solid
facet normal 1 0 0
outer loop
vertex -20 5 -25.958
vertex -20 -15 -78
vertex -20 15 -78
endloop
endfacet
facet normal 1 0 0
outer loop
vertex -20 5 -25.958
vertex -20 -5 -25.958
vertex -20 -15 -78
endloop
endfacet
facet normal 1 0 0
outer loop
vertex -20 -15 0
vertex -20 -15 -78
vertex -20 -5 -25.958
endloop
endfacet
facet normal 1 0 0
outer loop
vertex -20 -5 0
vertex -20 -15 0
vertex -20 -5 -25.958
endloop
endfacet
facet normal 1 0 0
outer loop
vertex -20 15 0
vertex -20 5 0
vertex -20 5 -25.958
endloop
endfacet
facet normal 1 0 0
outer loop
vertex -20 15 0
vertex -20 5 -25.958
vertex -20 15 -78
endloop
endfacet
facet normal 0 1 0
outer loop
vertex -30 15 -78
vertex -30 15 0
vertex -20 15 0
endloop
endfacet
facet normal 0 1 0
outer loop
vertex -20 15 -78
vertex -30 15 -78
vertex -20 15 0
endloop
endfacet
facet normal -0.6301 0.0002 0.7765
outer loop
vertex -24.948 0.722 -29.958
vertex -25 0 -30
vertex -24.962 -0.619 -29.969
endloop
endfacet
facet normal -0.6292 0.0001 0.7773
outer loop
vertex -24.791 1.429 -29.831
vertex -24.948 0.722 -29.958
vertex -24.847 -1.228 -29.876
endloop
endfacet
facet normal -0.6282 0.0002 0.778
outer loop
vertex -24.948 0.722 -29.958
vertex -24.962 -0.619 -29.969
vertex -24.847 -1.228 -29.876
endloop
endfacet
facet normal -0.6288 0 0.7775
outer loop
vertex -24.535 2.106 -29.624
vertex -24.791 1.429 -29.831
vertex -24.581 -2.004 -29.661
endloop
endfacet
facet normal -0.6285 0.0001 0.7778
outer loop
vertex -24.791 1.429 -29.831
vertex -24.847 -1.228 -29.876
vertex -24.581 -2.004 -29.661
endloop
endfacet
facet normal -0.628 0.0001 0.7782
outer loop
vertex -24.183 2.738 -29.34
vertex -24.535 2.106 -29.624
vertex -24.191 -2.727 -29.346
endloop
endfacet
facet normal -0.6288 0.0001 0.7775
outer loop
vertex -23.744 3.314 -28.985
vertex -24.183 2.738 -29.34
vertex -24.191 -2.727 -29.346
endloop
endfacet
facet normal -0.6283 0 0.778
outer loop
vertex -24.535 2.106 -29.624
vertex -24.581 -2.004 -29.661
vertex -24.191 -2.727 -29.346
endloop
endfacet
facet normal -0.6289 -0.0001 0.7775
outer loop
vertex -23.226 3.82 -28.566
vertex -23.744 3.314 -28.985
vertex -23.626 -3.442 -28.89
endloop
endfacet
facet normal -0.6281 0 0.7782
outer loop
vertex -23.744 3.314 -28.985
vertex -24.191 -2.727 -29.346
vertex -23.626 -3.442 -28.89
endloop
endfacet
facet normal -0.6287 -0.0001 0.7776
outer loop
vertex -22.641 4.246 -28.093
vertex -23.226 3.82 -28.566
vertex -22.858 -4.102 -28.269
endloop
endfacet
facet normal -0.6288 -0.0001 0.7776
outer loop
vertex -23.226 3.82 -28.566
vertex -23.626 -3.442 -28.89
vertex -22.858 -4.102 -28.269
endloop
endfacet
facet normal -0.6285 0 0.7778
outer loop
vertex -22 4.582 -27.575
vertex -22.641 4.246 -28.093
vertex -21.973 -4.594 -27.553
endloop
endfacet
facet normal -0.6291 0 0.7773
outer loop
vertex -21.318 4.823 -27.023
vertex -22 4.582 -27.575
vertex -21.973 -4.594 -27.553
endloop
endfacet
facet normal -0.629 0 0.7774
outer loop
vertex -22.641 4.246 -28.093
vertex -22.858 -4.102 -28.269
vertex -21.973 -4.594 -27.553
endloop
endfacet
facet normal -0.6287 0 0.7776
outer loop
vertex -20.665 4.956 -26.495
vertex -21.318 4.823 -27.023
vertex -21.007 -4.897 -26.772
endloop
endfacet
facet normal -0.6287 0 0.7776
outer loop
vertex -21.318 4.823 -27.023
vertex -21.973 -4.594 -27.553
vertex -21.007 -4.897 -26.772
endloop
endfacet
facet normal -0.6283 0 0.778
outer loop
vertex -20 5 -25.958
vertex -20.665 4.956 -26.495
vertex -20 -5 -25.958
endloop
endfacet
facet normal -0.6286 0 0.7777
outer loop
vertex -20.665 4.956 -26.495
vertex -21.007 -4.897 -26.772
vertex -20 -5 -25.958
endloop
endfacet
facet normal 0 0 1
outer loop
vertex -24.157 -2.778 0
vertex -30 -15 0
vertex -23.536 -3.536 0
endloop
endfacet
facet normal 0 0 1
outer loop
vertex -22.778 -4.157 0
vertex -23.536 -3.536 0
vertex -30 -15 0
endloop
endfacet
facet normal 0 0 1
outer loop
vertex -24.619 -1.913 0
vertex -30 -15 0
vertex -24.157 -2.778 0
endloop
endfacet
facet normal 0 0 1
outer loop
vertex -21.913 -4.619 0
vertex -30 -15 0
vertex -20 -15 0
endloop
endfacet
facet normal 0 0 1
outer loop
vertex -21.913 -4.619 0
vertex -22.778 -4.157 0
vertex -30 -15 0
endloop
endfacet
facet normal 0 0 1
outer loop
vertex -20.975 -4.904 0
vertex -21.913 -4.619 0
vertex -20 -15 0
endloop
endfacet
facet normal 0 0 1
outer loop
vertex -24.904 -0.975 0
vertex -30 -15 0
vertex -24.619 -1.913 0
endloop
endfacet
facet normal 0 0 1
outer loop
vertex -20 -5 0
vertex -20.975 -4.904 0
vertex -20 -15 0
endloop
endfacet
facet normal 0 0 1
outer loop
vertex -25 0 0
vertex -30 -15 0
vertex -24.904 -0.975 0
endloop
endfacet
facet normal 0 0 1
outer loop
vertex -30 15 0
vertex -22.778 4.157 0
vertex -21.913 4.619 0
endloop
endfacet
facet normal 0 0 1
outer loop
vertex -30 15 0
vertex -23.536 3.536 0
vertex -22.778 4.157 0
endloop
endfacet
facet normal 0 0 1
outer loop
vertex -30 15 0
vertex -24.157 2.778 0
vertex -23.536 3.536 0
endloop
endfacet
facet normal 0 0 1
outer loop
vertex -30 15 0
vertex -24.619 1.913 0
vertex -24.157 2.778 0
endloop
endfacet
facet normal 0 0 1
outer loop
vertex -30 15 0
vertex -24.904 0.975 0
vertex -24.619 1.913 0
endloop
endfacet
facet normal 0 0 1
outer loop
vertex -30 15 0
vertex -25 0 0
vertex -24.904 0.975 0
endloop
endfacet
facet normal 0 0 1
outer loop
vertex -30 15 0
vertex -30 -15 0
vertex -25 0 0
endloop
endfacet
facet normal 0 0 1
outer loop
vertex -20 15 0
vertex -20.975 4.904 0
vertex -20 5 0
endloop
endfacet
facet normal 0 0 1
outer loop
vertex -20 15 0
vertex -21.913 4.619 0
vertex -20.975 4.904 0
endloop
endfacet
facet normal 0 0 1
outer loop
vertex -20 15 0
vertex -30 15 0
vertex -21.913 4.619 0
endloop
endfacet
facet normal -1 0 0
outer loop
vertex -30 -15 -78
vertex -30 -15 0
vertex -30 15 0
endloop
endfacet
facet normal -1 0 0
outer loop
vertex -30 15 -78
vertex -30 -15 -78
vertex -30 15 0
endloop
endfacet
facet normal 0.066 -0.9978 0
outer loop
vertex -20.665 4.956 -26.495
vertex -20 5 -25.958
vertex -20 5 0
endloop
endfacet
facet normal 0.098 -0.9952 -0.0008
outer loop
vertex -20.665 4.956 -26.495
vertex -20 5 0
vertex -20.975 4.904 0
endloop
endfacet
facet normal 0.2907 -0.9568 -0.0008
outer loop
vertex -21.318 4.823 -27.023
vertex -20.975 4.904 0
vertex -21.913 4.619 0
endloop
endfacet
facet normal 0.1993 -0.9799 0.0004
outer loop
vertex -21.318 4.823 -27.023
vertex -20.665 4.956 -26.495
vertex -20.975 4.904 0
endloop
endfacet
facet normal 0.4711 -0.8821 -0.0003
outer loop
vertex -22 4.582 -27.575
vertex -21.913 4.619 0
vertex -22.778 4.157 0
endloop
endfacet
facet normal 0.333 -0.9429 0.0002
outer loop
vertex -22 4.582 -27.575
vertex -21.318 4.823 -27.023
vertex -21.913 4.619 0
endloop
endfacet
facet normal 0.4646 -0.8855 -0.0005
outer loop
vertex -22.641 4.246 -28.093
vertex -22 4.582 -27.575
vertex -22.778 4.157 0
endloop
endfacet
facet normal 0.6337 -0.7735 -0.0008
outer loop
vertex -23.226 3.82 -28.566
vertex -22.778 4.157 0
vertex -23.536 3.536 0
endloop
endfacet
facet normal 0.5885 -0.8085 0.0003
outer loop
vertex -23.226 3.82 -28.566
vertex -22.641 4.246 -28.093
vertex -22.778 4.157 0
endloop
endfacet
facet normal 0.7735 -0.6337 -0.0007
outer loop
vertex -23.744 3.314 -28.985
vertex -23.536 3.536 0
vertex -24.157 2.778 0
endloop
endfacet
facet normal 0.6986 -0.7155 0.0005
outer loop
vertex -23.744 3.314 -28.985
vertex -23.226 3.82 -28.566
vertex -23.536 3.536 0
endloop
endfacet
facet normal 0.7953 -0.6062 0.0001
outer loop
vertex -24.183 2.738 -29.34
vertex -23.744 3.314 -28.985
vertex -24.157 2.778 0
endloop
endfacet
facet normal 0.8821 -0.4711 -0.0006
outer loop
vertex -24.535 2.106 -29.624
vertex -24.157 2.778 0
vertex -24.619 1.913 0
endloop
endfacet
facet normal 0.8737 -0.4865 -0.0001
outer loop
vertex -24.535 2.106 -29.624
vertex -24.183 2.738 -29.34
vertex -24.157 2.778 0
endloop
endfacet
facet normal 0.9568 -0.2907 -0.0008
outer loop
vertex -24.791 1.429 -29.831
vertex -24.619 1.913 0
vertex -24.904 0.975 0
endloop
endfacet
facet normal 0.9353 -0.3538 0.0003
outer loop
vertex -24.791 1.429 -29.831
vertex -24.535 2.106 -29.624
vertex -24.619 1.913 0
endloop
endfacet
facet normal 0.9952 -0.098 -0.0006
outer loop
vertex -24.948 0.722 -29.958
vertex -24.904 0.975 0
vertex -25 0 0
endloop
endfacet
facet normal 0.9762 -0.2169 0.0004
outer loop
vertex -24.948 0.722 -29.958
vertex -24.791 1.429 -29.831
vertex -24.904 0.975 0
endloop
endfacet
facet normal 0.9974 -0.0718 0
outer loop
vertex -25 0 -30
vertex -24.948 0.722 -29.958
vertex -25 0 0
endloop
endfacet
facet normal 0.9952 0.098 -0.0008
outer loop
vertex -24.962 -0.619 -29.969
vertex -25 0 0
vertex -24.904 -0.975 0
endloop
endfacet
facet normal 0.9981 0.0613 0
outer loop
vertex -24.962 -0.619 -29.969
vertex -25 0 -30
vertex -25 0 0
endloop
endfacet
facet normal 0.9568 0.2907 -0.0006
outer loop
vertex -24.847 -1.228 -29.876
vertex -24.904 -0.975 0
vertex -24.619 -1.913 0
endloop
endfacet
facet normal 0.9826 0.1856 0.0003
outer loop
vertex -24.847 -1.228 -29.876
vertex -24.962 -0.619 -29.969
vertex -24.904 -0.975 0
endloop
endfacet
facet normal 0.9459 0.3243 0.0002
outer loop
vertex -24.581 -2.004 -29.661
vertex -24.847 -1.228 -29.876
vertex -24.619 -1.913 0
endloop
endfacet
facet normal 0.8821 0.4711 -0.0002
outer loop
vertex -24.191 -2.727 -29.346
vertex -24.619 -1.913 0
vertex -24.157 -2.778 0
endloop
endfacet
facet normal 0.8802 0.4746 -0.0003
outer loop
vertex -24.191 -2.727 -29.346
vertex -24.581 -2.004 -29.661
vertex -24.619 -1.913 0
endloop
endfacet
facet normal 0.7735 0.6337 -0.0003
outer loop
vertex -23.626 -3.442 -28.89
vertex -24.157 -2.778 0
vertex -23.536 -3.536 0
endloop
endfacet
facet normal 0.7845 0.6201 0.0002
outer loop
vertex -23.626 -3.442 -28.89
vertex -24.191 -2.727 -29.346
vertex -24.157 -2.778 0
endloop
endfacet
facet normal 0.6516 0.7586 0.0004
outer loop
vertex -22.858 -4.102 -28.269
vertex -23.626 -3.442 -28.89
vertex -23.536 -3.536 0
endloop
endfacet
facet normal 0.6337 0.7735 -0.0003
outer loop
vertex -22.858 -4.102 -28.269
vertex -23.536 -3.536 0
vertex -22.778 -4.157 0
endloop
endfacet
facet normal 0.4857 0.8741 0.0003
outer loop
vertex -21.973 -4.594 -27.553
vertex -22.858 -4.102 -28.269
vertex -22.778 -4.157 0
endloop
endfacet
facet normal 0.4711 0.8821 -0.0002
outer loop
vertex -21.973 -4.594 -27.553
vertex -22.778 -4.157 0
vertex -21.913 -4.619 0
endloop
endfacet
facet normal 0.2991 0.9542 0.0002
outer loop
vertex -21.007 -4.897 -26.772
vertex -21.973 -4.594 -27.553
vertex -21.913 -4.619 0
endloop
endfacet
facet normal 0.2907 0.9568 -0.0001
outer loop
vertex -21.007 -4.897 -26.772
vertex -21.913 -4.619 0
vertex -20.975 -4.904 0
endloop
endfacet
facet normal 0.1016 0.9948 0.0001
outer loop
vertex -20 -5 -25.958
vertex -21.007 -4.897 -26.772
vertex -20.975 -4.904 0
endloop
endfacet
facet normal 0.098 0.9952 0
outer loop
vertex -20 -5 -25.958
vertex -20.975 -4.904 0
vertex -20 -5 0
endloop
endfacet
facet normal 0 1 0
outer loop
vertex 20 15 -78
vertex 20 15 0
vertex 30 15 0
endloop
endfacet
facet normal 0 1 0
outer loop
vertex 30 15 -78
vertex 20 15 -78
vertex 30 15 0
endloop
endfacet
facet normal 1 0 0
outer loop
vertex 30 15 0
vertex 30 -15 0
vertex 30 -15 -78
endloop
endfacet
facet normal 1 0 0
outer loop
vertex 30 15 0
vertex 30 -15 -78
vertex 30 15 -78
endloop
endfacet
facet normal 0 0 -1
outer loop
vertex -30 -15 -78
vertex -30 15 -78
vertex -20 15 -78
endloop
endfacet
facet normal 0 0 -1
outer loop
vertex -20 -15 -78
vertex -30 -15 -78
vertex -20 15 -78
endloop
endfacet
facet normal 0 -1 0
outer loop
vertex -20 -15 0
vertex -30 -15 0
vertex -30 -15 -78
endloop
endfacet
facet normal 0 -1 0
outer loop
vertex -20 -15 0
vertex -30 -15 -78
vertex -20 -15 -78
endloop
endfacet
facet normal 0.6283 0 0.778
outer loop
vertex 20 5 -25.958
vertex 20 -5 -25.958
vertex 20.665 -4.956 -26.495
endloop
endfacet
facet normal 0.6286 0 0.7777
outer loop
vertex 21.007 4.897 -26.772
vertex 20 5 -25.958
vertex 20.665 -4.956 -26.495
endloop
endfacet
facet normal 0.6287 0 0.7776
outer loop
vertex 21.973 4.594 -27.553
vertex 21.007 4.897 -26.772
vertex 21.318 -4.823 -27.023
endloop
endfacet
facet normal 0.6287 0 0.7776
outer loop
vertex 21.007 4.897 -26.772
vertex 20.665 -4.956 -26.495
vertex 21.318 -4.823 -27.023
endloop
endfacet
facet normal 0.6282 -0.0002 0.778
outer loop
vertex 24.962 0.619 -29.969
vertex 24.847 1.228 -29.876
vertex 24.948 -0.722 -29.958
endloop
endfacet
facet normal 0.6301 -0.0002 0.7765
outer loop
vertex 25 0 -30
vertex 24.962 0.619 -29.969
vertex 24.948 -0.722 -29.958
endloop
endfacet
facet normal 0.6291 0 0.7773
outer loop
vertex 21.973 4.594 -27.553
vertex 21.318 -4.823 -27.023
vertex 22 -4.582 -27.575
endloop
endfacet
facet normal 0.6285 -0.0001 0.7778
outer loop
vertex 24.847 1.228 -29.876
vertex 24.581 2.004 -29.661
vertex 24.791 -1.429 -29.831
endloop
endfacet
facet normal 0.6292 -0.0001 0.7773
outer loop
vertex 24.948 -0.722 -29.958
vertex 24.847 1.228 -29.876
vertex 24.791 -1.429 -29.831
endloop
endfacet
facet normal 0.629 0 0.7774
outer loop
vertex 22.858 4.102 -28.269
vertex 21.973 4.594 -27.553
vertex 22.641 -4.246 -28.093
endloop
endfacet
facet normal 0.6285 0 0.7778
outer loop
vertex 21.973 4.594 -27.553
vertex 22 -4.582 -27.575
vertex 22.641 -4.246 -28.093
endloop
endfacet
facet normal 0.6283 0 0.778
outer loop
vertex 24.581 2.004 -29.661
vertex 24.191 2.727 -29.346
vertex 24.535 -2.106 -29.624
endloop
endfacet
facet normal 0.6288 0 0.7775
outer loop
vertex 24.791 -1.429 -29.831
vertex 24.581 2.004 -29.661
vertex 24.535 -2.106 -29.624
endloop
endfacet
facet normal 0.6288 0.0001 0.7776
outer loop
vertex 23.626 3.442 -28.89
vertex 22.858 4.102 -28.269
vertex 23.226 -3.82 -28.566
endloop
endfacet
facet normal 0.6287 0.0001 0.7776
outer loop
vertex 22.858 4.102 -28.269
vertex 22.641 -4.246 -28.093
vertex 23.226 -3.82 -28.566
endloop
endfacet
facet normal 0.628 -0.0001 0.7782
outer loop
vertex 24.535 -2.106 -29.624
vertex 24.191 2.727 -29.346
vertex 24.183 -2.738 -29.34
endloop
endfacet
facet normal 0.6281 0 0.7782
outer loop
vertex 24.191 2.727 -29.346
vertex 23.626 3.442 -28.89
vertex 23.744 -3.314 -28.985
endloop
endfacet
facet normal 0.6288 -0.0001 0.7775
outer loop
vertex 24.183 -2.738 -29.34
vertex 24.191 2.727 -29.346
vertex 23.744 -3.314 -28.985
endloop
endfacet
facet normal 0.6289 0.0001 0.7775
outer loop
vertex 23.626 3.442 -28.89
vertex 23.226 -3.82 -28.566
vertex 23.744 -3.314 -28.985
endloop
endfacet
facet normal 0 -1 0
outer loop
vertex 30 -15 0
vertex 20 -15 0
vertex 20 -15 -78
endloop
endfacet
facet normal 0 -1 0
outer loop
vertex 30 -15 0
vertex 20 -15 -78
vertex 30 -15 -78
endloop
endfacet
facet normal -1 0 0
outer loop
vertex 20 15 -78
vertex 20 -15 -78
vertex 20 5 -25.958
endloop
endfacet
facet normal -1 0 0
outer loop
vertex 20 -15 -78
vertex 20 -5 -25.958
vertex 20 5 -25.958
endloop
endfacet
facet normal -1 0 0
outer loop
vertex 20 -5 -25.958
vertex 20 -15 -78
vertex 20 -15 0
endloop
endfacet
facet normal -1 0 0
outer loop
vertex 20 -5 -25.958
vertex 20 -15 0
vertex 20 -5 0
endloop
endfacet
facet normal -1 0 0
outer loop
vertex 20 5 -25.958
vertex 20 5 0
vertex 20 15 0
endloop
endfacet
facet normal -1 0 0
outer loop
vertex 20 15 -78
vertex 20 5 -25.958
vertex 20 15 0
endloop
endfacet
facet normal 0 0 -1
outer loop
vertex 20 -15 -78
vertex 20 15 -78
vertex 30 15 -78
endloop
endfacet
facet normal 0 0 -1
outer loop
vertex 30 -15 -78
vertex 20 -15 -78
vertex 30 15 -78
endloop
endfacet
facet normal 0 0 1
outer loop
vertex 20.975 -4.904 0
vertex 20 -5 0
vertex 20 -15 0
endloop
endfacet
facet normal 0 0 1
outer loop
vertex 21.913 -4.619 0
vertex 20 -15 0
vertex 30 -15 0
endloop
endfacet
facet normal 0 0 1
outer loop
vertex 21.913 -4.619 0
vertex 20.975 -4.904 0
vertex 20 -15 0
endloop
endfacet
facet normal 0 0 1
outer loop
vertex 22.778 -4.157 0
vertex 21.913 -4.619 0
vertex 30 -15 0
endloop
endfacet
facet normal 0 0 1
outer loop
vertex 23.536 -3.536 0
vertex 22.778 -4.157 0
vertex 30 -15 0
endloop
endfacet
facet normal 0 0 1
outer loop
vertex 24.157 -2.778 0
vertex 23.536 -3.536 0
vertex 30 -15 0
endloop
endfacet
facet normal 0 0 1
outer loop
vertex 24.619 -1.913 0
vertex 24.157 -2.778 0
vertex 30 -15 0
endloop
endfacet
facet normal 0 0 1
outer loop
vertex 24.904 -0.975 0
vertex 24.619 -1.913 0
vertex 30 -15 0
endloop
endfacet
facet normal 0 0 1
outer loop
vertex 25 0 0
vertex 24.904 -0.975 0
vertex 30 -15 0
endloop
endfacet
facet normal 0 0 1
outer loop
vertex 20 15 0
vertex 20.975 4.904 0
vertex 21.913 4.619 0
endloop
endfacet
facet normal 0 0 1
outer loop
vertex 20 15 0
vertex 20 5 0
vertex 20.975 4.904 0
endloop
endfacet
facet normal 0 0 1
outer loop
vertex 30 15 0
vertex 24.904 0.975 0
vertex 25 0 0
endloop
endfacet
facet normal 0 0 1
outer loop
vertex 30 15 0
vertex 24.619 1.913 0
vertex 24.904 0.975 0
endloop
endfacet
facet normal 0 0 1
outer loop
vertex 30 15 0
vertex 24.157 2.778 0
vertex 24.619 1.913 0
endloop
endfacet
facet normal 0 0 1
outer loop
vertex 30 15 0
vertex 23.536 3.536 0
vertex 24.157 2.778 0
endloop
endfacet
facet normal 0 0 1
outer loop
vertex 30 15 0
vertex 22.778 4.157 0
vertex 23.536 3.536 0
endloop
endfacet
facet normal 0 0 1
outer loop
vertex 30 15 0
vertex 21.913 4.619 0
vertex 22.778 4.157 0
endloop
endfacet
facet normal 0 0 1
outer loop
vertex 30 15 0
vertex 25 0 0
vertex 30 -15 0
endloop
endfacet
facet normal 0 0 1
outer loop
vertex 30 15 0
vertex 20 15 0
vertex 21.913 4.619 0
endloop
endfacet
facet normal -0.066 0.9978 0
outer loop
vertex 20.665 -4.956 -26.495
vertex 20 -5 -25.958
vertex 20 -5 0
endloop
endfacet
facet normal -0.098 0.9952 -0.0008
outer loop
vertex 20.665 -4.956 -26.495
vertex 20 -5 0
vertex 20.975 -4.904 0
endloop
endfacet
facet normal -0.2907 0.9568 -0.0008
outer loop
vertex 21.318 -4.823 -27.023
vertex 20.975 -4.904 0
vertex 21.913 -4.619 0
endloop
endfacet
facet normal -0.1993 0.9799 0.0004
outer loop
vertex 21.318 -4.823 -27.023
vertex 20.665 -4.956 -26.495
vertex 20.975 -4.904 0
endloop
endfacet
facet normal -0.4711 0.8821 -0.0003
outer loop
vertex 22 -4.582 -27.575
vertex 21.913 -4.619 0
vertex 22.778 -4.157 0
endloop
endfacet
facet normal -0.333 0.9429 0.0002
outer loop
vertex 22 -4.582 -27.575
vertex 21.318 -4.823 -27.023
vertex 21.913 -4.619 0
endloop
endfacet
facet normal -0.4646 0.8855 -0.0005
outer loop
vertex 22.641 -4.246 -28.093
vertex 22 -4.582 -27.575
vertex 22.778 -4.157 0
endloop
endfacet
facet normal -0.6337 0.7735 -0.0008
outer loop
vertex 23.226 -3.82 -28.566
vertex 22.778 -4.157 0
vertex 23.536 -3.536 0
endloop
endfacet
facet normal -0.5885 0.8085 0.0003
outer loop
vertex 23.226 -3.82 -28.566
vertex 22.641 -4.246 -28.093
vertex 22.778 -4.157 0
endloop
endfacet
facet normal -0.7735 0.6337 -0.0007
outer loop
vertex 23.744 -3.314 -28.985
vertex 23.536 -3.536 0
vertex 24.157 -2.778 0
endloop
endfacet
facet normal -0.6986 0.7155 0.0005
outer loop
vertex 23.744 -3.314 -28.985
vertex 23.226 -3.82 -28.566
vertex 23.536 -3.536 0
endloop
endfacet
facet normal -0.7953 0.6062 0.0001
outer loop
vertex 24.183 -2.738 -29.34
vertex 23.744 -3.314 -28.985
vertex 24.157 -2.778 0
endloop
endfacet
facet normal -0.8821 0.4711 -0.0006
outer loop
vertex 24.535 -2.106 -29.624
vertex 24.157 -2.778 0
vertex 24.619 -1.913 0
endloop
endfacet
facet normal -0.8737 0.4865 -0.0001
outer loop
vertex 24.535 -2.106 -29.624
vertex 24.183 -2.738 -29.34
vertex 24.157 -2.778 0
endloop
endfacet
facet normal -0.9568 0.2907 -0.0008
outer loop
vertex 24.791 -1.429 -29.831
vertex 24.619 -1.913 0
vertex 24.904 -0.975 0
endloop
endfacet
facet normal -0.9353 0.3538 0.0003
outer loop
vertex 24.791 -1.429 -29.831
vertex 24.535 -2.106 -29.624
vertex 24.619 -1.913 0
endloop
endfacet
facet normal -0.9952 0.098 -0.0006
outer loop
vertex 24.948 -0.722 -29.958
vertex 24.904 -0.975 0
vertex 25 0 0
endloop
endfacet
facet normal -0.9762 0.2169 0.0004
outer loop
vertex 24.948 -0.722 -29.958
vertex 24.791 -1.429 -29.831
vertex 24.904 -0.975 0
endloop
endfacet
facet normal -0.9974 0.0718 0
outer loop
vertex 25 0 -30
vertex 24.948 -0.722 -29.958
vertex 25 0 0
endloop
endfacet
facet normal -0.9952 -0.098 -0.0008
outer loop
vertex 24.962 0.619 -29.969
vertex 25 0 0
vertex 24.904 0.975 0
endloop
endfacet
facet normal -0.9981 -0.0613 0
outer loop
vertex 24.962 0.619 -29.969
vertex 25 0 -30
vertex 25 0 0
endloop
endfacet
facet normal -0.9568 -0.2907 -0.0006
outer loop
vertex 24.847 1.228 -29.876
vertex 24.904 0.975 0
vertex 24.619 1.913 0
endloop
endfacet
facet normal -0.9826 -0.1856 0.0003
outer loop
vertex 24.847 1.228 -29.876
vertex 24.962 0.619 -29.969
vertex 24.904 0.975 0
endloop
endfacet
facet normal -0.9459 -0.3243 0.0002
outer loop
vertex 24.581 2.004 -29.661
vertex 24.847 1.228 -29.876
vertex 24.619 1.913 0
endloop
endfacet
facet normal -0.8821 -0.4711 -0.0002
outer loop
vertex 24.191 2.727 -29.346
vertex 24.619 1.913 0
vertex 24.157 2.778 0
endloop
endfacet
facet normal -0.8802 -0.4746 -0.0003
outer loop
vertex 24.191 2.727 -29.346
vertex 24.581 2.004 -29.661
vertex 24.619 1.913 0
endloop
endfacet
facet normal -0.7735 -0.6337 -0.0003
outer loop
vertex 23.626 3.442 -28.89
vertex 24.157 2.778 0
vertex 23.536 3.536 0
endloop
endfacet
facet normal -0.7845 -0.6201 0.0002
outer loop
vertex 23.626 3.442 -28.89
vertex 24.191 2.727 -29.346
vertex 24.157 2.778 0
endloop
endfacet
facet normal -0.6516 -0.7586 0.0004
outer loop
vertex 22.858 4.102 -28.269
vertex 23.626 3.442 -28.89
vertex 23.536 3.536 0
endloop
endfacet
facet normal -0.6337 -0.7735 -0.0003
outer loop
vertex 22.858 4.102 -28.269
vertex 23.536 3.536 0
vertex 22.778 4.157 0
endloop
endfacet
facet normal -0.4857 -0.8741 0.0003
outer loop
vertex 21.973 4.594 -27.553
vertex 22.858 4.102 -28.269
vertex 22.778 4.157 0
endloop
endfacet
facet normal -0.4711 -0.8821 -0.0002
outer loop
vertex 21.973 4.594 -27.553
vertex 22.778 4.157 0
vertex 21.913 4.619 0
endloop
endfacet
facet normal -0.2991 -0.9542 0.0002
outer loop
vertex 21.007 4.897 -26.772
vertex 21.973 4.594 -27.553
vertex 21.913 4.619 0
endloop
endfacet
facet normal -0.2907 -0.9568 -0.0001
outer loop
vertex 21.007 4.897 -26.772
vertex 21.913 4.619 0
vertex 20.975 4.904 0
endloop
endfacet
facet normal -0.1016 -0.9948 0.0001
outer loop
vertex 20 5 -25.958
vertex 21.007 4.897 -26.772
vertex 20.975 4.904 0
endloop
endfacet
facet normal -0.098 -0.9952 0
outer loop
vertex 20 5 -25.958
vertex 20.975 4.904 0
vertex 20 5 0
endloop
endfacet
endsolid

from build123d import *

# Parameters (mm, degrees)
SKETCH1_W             = 10
SKETCH1_H             = 30
BOSS_EXTRUDE2_DEPTH   = 77.999962115
BOSS_EXTRUDE2_2_DEPTH = 77.999962115
CAVITY1_START         = -30
CAVITY1_DEPTH         = 30
CAVITY1_START_2       = -6
CAVITY1_2_DEPTH       = 12
CAVITY1_3_DEPTH       = 30
CAVITY1_4_DEPTH       = 12


with BuildPart() as part:
    # Sketch1 → Boss-Extrude2 (new body)
    with BuildSketch(Plane.XY):
        with Locations((-25, 0)):
            Rectangle(SKETCH1_W, SKETCH1_H)
    extrude(amount=-BOSS_EXTRUDE2_DEPTH)

    # Cavity1 3 outline → Cavity1 3 (cut)
    with BuildSketch(Plane.XY.offset(CAVITY1_START)):
        with BuildLine():
            Line((-20, -5), (-20, 5))
            ThreePointArc((-20, 5), (-25, 0), (-20, -5))
        make_face()
    extrude(amount=CAVITY1_3_DEPTH, mode=Mode.SUBTRACT)

    # Cavity1 4 outline → Cavity1 4 (add)
    with BuildSketch(Plane(origin=(0, 0, 0), x_dir=(1, 0, 0), z_dir=(0, 1, 0)).offset(CAVITY1_START_2)):
        Polygon((-20, 30), (-25, 30), (-20, 25.958039892), align=None)
    extrude(amount=CAVITY1_4_DEPTH)


with BuildPart() as body_2:
    # Sketch1 → Boss-Extrude2 2 (new body)
    with BuildSketch(Plane.XY):
        with Locations((25, 0)):
            Rectangle(SKETCH1_W, SKETCH1_H)
    extrude(amount=-BOSS_EXTRUDE2_2_DEPTH)

    # Cavity1: read off the stored shape, not the designer's step
    # Cavity1 outline → Cavity1 (cut)
    with BuildSketch(Plane.XY.offset(CAVITY1_START)):
        with BuildLine():
            ThreePointArc((20, -5), (25, 0), (20, 5))
            Line((20, 5), (20, -5))
        make_face()
    extrude(amount=CAVITY1_DEPTH, mode=Mode.SUBTRACT)

    # Cavity1 2 outline → Cavity1 2 (add)
    with BuildSketch(Plane(origin=(0, 0, 0), x_dir=(1, 0, 0), z_dir=(0, 1, 0)).offset(CAVITY1_START_2)):
        Polygon((20, 30), (20, 25.958039892), (25, 30), align=None)
    extrude(amount=CAVITY1_2_DEPTH)


solid = Compound([part.part, body_2.part])
